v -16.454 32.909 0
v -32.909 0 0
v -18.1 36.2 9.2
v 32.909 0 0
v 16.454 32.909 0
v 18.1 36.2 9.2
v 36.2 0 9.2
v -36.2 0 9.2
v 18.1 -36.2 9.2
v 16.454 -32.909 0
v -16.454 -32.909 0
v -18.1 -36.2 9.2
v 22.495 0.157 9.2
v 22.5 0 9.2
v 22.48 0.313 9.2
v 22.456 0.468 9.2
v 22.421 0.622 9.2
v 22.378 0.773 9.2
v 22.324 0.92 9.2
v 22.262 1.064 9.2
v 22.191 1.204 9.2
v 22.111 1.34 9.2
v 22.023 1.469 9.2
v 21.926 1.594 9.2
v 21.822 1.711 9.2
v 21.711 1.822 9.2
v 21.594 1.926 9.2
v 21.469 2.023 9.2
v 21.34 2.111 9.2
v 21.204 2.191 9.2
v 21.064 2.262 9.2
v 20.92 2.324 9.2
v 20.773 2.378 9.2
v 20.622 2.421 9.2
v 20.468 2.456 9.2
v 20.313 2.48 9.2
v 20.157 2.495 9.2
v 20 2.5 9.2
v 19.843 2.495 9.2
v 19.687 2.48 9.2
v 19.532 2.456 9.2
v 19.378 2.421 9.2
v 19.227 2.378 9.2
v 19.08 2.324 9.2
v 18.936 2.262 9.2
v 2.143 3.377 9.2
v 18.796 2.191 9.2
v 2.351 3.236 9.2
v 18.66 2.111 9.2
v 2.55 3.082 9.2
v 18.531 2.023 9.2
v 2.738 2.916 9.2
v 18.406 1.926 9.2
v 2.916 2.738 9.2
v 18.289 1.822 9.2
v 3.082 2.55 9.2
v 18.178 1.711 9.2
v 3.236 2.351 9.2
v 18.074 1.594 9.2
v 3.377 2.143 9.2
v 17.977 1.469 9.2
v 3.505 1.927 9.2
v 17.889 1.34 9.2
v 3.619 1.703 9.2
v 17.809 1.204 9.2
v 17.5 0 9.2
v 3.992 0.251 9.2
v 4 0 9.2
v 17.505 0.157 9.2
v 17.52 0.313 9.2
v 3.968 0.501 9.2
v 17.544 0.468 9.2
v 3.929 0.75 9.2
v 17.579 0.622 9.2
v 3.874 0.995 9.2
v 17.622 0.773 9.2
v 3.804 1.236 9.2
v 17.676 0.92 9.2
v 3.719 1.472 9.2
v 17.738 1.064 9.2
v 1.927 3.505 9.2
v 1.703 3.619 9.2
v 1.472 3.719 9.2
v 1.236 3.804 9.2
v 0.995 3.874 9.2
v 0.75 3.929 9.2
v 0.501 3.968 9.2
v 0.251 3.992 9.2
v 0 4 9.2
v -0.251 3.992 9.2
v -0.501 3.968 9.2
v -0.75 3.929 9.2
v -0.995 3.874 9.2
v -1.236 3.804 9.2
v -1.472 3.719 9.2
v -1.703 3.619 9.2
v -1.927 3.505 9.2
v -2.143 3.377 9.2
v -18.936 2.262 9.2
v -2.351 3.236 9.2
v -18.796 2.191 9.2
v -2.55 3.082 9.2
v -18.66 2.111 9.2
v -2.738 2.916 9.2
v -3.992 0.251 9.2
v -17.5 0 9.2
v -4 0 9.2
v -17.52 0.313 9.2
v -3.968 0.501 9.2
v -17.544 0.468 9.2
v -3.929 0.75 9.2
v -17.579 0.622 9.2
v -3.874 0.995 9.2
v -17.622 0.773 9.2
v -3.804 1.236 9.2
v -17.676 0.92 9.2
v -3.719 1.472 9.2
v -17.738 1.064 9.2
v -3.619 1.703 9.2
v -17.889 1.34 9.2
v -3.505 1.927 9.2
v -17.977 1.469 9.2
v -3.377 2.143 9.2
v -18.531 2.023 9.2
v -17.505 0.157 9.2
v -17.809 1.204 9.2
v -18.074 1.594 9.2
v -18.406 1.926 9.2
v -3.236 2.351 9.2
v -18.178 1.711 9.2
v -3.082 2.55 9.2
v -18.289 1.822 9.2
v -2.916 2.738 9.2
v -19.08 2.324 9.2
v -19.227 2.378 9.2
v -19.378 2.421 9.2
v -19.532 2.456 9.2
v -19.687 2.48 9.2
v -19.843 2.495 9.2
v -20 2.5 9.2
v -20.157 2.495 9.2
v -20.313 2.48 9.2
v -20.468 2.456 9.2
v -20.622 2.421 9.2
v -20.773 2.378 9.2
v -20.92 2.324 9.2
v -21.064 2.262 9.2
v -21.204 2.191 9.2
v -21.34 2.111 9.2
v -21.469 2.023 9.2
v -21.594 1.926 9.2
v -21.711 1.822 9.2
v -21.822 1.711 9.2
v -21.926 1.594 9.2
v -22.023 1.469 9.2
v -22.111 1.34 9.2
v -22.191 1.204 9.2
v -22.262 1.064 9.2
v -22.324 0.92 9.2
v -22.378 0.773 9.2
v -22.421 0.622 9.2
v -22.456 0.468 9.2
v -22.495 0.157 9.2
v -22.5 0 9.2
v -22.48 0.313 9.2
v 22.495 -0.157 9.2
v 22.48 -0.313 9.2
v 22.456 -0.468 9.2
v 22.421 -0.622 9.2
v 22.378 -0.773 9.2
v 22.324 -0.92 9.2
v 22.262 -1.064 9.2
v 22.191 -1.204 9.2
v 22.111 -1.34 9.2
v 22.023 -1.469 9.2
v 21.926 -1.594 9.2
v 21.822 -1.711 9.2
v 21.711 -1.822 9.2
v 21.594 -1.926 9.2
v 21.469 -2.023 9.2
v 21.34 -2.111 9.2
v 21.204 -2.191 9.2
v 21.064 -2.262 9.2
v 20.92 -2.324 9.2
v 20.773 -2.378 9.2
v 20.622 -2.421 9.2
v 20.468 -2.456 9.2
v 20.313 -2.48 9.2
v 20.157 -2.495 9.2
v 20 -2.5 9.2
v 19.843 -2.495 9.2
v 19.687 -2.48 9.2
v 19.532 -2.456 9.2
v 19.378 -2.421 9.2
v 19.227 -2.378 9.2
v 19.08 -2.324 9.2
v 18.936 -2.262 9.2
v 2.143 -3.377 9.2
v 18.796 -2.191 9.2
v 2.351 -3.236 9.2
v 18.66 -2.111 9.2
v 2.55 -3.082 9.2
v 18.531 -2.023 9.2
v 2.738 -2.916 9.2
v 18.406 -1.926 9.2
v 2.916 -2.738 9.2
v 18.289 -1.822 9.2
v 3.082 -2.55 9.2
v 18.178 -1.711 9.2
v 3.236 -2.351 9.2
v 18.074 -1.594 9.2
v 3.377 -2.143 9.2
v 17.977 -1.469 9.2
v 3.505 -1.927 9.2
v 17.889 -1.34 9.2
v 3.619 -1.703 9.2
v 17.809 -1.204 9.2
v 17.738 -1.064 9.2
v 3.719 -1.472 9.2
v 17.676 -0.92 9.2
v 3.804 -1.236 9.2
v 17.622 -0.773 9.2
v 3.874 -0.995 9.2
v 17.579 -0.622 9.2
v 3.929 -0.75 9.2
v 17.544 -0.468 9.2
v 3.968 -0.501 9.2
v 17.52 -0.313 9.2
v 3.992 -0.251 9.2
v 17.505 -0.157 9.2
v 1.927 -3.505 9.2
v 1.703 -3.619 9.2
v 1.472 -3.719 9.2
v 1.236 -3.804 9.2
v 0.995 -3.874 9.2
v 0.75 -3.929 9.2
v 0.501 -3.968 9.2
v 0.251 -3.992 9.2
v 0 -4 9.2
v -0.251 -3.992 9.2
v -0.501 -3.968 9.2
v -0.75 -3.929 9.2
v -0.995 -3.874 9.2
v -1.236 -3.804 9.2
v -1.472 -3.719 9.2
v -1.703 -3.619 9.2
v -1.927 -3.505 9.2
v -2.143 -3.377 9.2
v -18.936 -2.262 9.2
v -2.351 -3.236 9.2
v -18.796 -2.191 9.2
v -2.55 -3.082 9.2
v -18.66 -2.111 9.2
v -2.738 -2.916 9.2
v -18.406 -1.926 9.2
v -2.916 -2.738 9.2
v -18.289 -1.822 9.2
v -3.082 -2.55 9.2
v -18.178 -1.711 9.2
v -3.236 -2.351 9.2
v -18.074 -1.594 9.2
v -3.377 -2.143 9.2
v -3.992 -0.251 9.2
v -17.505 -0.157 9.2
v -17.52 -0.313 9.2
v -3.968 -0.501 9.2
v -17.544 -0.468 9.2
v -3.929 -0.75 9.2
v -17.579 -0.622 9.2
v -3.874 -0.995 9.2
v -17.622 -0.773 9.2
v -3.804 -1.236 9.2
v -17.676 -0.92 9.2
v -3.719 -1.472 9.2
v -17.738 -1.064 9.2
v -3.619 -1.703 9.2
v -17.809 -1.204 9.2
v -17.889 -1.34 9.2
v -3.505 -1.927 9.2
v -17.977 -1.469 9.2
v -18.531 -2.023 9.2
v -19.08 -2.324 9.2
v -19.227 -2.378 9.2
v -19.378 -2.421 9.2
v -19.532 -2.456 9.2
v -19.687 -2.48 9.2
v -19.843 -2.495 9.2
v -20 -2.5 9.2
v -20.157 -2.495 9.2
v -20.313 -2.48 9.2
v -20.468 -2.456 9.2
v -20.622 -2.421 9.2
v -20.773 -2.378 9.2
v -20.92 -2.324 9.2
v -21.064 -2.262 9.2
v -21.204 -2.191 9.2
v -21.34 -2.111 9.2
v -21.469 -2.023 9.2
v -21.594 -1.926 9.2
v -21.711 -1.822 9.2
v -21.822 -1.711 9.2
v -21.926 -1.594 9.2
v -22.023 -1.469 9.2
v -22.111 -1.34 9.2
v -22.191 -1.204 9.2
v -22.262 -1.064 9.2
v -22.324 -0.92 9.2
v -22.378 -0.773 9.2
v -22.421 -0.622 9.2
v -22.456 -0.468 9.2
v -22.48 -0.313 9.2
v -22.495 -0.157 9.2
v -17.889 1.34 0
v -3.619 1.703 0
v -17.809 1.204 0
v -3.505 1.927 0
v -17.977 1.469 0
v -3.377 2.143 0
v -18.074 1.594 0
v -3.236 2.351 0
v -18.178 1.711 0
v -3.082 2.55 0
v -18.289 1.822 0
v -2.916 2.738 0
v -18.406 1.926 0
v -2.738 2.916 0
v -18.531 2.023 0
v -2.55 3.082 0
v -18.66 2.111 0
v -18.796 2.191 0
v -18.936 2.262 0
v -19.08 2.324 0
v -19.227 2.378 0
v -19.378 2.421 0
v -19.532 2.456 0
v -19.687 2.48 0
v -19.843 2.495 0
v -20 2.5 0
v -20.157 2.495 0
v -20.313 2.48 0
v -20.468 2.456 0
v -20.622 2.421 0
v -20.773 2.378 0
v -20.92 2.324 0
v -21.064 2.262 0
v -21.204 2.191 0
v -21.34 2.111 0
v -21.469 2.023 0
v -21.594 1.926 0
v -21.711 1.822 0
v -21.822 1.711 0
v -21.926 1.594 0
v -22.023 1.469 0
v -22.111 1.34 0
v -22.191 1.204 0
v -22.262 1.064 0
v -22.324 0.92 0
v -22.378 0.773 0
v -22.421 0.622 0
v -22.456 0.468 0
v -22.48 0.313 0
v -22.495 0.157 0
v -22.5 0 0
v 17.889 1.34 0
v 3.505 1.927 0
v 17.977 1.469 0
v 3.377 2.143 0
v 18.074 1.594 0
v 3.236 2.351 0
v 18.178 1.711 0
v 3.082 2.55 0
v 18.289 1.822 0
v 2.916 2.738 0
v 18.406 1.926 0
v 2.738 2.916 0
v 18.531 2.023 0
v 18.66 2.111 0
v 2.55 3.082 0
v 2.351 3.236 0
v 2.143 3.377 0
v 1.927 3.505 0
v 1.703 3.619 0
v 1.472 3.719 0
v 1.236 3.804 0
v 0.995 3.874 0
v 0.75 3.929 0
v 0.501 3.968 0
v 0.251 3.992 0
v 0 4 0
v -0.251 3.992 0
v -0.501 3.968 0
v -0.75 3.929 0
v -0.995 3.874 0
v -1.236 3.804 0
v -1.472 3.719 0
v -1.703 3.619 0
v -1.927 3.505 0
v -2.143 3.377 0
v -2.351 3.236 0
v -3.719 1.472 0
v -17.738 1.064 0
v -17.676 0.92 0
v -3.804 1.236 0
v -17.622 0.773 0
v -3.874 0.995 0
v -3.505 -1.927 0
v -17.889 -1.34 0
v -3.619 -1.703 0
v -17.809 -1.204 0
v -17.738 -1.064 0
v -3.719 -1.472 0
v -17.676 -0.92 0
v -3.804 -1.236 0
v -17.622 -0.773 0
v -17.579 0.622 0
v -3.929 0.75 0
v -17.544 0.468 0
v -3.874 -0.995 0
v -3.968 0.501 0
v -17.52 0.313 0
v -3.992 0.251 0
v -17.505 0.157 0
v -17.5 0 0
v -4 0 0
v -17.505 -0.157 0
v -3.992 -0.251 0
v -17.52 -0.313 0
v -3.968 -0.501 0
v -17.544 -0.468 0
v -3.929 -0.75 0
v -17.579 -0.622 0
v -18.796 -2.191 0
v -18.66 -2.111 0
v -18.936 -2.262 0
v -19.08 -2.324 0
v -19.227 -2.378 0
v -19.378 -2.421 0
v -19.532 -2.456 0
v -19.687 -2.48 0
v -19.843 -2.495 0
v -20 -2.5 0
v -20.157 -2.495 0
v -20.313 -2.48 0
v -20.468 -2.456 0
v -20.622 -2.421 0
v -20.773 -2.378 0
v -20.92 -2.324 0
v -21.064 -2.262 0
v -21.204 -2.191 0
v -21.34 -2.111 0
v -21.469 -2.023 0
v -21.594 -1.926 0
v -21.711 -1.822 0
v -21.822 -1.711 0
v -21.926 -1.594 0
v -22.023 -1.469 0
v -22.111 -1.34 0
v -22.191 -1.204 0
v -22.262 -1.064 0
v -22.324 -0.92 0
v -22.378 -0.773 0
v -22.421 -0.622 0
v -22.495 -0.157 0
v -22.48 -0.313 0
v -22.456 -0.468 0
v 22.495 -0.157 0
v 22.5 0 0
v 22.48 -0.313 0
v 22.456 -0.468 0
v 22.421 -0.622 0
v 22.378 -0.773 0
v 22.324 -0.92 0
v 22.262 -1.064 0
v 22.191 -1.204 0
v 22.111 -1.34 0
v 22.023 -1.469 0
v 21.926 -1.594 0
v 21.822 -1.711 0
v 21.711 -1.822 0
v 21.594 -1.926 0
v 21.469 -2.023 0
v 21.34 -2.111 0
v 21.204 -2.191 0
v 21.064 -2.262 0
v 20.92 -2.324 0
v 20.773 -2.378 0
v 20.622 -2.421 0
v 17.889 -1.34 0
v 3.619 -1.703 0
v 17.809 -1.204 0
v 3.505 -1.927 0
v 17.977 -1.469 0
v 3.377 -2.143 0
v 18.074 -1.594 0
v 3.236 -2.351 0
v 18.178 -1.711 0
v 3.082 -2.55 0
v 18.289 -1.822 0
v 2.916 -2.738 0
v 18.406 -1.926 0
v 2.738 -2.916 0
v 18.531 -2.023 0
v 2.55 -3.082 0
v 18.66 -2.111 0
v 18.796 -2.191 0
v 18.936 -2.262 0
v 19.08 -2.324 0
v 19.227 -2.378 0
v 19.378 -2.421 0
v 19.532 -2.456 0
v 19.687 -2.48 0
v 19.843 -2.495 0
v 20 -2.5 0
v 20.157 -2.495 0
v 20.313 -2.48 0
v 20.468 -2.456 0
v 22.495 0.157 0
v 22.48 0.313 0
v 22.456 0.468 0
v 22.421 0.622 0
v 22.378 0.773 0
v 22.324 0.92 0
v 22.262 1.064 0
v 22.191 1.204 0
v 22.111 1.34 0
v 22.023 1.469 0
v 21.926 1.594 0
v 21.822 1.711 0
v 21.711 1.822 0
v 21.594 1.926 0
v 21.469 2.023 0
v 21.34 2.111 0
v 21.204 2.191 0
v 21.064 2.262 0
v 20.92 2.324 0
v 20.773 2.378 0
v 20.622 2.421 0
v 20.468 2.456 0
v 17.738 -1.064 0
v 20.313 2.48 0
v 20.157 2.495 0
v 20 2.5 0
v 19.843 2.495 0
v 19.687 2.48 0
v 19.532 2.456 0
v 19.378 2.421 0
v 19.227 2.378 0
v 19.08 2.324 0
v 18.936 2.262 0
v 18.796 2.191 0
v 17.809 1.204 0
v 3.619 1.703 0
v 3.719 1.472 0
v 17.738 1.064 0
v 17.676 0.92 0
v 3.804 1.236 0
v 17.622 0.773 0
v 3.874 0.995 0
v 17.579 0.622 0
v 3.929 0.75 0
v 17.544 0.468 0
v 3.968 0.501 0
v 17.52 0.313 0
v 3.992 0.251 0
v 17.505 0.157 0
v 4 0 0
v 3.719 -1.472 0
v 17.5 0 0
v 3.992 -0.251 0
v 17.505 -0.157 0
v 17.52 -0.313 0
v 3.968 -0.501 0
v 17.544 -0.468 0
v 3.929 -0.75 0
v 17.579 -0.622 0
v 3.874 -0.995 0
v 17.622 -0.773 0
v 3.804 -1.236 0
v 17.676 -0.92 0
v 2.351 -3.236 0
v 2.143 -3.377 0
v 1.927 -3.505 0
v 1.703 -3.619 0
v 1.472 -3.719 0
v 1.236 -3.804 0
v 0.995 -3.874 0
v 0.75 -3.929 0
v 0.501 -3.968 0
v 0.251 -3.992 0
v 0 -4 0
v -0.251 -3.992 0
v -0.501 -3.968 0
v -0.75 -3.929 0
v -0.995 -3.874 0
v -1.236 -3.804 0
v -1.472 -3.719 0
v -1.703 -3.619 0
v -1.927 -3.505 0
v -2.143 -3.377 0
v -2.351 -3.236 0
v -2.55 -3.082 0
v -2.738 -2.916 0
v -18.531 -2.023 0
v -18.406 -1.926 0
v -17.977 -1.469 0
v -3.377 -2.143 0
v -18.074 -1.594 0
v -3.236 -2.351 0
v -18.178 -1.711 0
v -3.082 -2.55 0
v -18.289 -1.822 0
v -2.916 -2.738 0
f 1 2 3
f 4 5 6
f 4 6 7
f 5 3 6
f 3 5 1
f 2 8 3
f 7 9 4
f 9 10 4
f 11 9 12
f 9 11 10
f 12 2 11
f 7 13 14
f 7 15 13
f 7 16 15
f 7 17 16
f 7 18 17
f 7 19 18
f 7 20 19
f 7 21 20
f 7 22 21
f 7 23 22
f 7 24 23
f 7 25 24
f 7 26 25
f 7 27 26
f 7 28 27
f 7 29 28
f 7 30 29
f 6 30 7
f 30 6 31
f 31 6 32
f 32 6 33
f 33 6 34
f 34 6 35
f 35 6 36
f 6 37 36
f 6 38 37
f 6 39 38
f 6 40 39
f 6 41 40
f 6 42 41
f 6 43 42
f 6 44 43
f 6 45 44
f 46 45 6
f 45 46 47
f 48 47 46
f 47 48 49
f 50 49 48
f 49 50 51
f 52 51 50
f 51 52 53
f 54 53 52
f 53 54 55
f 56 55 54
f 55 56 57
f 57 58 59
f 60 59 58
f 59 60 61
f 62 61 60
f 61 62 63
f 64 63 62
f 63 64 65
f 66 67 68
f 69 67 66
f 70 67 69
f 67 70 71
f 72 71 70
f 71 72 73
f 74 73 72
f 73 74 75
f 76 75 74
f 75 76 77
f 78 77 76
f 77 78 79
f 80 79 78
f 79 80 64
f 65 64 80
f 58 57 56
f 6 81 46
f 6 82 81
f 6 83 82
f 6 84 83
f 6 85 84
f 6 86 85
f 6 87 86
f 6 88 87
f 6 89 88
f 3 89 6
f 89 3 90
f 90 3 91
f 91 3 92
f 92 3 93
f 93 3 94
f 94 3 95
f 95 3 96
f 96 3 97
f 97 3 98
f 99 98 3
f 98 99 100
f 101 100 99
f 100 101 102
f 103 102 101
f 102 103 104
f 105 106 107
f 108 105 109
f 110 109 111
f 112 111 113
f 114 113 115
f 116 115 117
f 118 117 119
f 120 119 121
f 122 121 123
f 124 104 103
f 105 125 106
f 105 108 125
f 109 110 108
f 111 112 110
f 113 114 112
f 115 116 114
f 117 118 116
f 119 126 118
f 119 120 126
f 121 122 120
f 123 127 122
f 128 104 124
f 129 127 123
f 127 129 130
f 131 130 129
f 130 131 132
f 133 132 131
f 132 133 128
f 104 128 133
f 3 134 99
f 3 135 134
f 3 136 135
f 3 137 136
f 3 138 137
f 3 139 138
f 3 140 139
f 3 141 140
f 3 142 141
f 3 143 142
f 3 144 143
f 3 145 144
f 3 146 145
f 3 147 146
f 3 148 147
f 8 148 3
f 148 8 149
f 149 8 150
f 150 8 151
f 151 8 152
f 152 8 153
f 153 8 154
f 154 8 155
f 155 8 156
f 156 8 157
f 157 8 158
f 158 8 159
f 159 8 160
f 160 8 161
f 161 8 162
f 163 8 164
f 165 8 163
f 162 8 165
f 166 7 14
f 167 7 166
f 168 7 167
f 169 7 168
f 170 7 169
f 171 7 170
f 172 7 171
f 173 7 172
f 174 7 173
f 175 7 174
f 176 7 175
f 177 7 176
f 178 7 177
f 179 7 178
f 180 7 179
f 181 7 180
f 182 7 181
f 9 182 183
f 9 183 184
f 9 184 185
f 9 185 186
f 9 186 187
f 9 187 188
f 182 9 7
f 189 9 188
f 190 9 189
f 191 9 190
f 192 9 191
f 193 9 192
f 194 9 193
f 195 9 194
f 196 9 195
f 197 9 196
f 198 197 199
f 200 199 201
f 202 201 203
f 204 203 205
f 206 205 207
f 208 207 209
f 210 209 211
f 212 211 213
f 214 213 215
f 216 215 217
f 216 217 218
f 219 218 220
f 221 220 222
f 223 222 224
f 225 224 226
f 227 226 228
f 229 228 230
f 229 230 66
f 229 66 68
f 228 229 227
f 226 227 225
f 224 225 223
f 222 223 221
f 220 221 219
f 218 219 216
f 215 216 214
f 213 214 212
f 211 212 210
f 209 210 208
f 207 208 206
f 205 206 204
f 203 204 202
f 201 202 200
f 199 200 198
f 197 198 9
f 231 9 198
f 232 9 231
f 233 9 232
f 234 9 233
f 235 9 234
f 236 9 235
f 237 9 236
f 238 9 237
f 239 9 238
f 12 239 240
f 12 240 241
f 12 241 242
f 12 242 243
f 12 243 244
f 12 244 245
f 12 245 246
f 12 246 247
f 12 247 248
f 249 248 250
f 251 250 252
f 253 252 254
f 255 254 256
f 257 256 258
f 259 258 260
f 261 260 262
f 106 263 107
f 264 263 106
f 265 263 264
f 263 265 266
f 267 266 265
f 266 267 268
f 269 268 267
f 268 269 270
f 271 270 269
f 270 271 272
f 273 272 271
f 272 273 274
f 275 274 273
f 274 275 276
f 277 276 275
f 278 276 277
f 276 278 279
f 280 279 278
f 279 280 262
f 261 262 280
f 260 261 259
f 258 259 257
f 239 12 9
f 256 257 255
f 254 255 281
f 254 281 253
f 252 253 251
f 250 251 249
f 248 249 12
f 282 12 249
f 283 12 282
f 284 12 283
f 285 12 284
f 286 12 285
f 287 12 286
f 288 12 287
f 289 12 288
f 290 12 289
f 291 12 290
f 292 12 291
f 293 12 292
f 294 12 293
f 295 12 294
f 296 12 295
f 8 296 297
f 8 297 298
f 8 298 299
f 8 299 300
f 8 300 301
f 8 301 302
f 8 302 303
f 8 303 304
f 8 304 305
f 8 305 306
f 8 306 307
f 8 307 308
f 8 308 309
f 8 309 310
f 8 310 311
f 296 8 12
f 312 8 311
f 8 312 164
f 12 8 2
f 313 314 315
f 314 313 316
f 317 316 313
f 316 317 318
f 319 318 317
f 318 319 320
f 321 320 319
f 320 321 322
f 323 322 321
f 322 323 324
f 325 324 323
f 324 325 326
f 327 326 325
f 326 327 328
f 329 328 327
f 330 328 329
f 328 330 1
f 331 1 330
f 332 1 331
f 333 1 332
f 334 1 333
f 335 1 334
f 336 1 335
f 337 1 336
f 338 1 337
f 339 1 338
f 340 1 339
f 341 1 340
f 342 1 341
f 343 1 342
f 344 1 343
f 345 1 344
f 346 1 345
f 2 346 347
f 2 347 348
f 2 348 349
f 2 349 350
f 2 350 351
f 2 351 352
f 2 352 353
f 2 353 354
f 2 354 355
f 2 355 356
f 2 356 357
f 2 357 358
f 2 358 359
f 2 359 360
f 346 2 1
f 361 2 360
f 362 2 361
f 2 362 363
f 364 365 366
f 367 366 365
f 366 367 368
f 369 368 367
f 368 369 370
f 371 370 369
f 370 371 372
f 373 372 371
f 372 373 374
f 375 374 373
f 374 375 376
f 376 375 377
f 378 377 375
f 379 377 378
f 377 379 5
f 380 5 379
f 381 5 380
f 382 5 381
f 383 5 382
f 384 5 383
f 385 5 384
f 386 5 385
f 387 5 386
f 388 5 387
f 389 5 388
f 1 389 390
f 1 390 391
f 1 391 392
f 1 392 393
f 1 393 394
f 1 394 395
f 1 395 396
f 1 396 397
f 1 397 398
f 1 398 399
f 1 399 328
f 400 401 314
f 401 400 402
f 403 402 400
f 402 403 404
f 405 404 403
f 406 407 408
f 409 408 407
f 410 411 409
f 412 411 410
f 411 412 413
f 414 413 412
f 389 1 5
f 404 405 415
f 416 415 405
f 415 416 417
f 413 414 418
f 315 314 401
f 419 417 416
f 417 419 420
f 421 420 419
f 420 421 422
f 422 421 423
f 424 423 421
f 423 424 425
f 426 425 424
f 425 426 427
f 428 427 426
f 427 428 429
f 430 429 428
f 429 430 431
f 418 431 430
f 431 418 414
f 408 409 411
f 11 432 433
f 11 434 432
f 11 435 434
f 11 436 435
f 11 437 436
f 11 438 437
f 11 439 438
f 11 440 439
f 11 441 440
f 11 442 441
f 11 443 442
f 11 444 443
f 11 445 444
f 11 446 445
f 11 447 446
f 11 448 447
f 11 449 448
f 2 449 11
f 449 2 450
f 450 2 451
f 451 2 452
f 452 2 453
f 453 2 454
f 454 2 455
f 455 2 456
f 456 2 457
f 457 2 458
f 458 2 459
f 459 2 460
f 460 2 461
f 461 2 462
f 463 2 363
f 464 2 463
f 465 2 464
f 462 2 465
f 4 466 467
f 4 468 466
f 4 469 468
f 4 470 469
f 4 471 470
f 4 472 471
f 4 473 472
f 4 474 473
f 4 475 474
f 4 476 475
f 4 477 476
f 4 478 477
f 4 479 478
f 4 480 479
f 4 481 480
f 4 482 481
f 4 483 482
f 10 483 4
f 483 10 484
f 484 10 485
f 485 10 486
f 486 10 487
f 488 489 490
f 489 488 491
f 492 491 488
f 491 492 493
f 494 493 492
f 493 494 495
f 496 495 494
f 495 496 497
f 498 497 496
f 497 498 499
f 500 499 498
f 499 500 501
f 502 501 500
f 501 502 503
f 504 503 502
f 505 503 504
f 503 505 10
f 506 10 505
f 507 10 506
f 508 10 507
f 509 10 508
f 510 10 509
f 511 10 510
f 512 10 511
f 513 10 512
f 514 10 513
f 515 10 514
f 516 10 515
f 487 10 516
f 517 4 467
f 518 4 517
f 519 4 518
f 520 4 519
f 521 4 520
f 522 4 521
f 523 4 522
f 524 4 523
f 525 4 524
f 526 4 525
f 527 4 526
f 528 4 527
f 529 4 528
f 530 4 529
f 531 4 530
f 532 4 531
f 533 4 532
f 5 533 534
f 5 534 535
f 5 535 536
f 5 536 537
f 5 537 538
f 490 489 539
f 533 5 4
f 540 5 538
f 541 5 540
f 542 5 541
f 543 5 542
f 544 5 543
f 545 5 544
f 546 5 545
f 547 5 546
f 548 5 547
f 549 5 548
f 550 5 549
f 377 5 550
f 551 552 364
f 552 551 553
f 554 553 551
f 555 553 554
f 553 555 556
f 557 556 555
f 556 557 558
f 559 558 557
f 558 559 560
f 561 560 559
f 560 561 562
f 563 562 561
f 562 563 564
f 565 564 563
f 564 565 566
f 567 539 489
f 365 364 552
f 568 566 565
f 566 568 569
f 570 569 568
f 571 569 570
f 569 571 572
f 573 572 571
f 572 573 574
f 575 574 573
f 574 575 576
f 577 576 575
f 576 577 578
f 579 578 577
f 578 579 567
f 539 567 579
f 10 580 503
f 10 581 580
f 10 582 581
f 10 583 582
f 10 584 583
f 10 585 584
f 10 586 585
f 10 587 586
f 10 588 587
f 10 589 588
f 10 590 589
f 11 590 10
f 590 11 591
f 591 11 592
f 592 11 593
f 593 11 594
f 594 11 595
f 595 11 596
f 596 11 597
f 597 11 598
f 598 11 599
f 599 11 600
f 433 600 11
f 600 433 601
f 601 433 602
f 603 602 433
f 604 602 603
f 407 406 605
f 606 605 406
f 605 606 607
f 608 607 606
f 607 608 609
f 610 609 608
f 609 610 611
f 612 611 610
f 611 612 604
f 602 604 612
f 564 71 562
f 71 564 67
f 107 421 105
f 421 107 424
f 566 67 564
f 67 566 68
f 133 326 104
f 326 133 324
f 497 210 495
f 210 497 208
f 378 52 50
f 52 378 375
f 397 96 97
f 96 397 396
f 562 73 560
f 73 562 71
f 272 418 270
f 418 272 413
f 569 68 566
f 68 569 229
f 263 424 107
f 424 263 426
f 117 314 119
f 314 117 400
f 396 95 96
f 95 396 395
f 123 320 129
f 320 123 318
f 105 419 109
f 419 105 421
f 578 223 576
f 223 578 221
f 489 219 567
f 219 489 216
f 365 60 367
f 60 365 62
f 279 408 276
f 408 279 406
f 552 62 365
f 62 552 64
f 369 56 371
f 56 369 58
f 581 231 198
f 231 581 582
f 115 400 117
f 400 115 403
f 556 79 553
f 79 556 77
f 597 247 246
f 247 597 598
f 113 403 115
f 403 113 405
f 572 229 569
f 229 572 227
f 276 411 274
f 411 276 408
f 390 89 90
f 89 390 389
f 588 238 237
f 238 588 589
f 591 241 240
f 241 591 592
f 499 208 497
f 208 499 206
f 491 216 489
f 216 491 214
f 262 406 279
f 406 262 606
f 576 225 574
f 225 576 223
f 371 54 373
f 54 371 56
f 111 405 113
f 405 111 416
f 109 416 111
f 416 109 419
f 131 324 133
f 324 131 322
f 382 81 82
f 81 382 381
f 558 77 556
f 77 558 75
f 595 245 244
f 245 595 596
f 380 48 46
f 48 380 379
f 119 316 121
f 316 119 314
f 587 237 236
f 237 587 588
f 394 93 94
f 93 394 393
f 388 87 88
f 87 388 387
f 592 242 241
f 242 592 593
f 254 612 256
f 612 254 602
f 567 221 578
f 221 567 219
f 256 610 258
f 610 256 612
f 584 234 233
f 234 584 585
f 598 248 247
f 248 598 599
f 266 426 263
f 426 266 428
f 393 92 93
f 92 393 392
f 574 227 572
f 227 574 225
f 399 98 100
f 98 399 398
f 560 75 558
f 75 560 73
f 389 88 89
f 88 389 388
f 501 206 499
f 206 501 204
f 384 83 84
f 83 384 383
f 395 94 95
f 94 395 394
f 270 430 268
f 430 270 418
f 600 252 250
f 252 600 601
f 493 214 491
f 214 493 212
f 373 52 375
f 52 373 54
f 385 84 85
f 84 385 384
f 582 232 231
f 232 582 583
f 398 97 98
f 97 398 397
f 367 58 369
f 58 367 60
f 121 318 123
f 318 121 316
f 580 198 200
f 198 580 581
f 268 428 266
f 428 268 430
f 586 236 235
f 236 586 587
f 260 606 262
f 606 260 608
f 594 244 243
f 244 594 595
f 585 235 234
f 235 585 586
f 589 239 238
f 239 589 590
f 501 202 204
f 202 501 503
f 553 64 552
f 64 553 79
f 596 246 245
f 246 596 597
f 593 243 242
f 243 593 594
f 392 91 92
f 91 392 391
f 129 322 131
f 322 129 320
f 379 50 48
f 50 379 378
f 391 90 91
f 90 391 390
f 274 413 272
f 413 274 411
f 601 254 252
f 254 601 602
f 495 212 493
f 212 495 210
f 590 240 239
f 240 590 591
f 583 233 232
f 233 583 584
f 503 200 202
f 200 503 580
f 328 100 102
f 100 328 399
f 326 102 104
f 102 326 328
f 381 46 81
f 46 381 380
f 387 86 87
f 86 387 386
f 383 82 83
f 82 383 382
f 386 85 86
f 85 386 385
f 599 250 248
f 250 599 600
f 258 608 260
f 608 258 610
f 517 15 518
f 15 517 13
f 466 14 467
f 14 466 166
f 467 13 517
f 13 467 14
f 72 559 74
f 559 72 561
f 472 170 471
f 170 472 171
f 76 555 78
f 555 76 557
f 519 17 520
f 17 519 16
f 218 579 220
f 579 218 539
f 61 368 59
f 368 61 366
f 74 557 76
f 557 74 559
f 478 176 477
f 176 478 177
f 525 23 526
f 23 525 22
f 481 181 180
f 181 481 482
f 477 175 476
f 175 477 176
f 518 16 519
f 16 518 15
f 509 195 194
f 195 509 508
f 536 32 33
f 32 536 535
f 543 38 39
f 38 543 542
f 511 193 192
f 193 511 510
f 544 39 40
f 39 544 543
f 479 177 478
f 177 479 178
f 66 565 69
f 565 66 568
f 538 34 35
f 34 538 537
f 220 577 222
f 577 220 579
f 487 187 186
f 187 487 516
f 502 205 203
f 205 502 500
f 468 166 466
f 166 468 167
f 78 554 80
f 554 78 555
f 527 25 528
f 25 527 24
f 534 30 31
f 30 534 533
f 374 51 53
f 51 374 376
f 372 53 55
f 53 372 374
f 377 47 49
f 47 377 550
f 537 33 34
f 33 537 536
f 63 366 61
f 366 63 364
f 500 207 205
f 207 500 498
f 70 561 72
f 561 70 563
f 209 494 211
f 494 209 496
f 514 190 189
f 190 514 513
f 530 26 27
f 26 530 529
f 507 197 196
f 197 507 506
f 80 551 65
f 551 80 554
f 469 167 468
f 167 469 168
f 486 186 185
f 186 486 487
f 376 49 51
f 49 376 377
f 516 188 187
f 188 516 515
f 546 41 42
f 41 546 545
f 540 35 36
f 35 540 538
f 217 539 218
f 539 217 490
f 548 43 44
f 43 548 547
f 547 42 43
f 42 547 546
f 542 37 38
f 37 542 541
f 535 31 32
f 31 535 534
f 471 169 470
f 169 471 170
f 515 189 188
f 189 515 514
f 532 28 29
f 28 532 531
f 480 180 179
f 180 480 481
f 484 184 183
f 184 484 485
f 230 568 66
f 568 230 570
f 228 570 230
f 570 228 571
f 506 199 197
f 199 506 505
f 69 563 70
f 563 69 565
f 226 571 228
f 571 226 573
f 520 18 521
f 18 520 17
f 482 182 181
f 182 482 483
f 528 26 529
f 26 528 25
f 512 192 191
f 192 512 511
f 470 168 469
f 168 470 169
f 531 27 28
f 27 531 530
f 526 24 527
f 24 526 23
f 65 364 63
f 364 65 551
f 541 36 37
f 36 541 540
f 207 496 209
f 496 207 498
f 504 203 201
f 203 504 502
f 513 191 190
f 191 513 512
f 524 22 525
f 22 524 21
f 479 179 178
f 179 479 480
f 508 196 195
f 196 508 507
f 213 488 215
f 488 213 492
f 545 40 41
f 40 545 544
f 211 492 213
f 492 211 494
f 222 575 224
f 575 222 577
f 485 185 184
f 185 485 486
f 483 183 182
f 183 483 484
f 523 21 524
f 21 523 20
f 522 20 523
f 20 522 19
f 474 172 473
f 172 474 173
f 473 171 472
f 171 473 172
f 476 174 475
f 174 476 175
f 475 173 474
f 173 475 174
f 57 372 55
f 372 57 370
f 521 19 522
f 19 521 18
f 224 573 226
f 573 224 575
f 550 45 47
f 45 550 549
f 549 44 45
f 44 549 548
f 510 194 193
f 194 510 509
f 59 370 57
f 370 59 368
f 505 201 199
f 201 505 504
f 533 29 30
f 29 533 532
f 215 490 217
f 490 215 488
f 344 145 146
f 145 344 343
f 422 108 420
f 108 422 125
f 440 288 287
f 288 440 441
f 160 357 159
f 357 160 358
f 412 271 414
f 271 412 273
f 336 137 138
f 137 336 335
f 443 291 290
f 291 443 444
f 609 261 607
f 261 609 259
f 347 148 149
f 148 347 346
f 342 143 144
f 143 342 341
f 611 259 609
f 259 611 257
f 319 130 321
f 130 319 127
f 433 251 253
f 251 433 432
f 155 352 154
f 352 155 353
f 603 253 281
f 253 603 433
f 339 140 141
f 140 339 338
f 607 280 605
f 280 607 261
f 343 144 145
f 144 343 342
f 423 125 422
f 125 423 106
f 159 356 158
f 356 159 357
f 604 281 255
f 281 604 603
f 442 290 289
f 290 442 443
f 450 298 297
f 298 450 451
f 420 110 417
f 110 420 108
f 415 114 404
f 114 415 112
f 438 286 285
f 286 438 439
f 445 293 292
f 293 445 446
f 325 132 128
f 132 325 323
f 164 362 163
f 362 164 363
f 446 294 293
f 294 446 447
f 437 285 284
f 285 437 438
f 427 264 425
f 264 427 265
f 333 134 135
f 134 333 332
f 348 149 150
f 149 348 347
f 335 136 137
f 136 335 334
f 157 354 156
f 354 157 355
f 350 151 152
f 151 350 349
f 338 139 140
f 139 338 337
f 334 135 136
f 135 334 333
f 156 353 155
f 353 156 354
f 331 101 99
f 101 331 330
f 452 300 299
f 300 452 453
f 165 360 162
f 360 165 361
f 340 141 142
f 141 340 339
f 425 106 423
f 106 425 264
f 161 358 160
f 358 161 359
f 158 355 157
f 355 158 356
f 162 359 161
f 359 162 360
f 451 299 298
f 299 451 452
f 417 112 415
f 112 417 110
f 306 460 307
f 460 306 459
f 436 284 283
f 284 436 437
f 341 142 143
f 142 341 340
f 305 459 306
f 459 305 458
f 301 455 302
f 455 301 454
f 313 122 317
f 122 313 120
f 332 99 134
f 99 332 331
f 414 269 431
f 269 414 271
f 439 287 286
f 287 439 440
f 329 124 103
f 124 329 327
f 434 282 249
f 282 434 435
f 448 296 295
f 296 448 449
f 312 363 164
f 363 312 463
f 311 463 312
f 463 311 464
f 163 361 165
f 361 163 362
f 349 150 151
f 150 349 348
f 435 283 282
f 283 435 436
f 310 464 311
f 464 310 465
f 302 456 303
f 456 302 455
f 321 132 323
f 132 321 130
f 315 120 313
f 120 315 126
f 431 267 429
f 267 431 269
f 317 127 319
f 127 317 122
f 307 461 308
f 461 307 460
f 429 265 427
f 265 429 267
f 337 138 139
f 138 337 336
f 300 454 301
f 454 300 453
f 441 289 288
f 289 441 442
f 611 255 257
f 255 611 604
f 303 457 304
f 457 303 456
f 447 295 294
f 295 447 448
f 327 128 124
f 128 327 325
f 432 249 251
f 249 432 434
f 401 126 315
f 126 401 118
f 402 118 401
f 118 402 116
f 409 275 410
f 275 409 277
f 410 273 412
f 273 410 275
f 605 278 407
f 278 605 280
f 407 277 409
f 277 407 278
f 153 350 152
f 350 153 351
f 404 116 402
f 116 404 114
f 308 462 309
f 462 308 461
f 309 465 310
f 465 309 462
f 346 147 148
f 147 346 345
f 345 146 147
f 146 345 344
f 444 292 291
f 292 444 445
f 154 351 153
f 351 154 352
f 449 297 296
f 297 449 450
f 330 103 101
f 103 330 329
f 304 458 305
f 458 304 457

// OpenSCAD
// file: libraries/scmath/basic2d.scad
module line(x1, y1, x2, y2, thickness, round = true) {
    if(round == true) {
        hull() {
            translate([x1, y1, 0]) 
            circle(r = thickness);
            translate([x2, y2, 0])
            circle(r = thickness);
        }
    }
}

module regular_hexagon(side_length) {
  r = side_length * sqrt(3) / 2;

  points = [    [r, 0],
    [r / 2, side_length * 0.86602540378],
    [-r / 2, side_length * 0.86602540378],
    [-r, 0],
    [-r / 2, -side_length * 0.86602540378],
    [r / 2, -side_length * 0.86602540378]
  ];

  polygon(points);
}
// main file
use<libraries/scmath/basic2d.scad>

$fn=100;

difference() {
    linear_extrude(height = 9.2, scale = 1.1) 
    regular_hexagon(side_length = 38);

    translate([0, 0, -1]) 
    linear_extrude(height = 15)
    circle(d = 8);
    
    translate([20, 0, -1]) 
    linear_extrude(height = 15)
    circle(d = 5);
    
    translate([-20, 0, -1]) 
    linear_extrude(height = 15)
    circle(d = 5);
}
